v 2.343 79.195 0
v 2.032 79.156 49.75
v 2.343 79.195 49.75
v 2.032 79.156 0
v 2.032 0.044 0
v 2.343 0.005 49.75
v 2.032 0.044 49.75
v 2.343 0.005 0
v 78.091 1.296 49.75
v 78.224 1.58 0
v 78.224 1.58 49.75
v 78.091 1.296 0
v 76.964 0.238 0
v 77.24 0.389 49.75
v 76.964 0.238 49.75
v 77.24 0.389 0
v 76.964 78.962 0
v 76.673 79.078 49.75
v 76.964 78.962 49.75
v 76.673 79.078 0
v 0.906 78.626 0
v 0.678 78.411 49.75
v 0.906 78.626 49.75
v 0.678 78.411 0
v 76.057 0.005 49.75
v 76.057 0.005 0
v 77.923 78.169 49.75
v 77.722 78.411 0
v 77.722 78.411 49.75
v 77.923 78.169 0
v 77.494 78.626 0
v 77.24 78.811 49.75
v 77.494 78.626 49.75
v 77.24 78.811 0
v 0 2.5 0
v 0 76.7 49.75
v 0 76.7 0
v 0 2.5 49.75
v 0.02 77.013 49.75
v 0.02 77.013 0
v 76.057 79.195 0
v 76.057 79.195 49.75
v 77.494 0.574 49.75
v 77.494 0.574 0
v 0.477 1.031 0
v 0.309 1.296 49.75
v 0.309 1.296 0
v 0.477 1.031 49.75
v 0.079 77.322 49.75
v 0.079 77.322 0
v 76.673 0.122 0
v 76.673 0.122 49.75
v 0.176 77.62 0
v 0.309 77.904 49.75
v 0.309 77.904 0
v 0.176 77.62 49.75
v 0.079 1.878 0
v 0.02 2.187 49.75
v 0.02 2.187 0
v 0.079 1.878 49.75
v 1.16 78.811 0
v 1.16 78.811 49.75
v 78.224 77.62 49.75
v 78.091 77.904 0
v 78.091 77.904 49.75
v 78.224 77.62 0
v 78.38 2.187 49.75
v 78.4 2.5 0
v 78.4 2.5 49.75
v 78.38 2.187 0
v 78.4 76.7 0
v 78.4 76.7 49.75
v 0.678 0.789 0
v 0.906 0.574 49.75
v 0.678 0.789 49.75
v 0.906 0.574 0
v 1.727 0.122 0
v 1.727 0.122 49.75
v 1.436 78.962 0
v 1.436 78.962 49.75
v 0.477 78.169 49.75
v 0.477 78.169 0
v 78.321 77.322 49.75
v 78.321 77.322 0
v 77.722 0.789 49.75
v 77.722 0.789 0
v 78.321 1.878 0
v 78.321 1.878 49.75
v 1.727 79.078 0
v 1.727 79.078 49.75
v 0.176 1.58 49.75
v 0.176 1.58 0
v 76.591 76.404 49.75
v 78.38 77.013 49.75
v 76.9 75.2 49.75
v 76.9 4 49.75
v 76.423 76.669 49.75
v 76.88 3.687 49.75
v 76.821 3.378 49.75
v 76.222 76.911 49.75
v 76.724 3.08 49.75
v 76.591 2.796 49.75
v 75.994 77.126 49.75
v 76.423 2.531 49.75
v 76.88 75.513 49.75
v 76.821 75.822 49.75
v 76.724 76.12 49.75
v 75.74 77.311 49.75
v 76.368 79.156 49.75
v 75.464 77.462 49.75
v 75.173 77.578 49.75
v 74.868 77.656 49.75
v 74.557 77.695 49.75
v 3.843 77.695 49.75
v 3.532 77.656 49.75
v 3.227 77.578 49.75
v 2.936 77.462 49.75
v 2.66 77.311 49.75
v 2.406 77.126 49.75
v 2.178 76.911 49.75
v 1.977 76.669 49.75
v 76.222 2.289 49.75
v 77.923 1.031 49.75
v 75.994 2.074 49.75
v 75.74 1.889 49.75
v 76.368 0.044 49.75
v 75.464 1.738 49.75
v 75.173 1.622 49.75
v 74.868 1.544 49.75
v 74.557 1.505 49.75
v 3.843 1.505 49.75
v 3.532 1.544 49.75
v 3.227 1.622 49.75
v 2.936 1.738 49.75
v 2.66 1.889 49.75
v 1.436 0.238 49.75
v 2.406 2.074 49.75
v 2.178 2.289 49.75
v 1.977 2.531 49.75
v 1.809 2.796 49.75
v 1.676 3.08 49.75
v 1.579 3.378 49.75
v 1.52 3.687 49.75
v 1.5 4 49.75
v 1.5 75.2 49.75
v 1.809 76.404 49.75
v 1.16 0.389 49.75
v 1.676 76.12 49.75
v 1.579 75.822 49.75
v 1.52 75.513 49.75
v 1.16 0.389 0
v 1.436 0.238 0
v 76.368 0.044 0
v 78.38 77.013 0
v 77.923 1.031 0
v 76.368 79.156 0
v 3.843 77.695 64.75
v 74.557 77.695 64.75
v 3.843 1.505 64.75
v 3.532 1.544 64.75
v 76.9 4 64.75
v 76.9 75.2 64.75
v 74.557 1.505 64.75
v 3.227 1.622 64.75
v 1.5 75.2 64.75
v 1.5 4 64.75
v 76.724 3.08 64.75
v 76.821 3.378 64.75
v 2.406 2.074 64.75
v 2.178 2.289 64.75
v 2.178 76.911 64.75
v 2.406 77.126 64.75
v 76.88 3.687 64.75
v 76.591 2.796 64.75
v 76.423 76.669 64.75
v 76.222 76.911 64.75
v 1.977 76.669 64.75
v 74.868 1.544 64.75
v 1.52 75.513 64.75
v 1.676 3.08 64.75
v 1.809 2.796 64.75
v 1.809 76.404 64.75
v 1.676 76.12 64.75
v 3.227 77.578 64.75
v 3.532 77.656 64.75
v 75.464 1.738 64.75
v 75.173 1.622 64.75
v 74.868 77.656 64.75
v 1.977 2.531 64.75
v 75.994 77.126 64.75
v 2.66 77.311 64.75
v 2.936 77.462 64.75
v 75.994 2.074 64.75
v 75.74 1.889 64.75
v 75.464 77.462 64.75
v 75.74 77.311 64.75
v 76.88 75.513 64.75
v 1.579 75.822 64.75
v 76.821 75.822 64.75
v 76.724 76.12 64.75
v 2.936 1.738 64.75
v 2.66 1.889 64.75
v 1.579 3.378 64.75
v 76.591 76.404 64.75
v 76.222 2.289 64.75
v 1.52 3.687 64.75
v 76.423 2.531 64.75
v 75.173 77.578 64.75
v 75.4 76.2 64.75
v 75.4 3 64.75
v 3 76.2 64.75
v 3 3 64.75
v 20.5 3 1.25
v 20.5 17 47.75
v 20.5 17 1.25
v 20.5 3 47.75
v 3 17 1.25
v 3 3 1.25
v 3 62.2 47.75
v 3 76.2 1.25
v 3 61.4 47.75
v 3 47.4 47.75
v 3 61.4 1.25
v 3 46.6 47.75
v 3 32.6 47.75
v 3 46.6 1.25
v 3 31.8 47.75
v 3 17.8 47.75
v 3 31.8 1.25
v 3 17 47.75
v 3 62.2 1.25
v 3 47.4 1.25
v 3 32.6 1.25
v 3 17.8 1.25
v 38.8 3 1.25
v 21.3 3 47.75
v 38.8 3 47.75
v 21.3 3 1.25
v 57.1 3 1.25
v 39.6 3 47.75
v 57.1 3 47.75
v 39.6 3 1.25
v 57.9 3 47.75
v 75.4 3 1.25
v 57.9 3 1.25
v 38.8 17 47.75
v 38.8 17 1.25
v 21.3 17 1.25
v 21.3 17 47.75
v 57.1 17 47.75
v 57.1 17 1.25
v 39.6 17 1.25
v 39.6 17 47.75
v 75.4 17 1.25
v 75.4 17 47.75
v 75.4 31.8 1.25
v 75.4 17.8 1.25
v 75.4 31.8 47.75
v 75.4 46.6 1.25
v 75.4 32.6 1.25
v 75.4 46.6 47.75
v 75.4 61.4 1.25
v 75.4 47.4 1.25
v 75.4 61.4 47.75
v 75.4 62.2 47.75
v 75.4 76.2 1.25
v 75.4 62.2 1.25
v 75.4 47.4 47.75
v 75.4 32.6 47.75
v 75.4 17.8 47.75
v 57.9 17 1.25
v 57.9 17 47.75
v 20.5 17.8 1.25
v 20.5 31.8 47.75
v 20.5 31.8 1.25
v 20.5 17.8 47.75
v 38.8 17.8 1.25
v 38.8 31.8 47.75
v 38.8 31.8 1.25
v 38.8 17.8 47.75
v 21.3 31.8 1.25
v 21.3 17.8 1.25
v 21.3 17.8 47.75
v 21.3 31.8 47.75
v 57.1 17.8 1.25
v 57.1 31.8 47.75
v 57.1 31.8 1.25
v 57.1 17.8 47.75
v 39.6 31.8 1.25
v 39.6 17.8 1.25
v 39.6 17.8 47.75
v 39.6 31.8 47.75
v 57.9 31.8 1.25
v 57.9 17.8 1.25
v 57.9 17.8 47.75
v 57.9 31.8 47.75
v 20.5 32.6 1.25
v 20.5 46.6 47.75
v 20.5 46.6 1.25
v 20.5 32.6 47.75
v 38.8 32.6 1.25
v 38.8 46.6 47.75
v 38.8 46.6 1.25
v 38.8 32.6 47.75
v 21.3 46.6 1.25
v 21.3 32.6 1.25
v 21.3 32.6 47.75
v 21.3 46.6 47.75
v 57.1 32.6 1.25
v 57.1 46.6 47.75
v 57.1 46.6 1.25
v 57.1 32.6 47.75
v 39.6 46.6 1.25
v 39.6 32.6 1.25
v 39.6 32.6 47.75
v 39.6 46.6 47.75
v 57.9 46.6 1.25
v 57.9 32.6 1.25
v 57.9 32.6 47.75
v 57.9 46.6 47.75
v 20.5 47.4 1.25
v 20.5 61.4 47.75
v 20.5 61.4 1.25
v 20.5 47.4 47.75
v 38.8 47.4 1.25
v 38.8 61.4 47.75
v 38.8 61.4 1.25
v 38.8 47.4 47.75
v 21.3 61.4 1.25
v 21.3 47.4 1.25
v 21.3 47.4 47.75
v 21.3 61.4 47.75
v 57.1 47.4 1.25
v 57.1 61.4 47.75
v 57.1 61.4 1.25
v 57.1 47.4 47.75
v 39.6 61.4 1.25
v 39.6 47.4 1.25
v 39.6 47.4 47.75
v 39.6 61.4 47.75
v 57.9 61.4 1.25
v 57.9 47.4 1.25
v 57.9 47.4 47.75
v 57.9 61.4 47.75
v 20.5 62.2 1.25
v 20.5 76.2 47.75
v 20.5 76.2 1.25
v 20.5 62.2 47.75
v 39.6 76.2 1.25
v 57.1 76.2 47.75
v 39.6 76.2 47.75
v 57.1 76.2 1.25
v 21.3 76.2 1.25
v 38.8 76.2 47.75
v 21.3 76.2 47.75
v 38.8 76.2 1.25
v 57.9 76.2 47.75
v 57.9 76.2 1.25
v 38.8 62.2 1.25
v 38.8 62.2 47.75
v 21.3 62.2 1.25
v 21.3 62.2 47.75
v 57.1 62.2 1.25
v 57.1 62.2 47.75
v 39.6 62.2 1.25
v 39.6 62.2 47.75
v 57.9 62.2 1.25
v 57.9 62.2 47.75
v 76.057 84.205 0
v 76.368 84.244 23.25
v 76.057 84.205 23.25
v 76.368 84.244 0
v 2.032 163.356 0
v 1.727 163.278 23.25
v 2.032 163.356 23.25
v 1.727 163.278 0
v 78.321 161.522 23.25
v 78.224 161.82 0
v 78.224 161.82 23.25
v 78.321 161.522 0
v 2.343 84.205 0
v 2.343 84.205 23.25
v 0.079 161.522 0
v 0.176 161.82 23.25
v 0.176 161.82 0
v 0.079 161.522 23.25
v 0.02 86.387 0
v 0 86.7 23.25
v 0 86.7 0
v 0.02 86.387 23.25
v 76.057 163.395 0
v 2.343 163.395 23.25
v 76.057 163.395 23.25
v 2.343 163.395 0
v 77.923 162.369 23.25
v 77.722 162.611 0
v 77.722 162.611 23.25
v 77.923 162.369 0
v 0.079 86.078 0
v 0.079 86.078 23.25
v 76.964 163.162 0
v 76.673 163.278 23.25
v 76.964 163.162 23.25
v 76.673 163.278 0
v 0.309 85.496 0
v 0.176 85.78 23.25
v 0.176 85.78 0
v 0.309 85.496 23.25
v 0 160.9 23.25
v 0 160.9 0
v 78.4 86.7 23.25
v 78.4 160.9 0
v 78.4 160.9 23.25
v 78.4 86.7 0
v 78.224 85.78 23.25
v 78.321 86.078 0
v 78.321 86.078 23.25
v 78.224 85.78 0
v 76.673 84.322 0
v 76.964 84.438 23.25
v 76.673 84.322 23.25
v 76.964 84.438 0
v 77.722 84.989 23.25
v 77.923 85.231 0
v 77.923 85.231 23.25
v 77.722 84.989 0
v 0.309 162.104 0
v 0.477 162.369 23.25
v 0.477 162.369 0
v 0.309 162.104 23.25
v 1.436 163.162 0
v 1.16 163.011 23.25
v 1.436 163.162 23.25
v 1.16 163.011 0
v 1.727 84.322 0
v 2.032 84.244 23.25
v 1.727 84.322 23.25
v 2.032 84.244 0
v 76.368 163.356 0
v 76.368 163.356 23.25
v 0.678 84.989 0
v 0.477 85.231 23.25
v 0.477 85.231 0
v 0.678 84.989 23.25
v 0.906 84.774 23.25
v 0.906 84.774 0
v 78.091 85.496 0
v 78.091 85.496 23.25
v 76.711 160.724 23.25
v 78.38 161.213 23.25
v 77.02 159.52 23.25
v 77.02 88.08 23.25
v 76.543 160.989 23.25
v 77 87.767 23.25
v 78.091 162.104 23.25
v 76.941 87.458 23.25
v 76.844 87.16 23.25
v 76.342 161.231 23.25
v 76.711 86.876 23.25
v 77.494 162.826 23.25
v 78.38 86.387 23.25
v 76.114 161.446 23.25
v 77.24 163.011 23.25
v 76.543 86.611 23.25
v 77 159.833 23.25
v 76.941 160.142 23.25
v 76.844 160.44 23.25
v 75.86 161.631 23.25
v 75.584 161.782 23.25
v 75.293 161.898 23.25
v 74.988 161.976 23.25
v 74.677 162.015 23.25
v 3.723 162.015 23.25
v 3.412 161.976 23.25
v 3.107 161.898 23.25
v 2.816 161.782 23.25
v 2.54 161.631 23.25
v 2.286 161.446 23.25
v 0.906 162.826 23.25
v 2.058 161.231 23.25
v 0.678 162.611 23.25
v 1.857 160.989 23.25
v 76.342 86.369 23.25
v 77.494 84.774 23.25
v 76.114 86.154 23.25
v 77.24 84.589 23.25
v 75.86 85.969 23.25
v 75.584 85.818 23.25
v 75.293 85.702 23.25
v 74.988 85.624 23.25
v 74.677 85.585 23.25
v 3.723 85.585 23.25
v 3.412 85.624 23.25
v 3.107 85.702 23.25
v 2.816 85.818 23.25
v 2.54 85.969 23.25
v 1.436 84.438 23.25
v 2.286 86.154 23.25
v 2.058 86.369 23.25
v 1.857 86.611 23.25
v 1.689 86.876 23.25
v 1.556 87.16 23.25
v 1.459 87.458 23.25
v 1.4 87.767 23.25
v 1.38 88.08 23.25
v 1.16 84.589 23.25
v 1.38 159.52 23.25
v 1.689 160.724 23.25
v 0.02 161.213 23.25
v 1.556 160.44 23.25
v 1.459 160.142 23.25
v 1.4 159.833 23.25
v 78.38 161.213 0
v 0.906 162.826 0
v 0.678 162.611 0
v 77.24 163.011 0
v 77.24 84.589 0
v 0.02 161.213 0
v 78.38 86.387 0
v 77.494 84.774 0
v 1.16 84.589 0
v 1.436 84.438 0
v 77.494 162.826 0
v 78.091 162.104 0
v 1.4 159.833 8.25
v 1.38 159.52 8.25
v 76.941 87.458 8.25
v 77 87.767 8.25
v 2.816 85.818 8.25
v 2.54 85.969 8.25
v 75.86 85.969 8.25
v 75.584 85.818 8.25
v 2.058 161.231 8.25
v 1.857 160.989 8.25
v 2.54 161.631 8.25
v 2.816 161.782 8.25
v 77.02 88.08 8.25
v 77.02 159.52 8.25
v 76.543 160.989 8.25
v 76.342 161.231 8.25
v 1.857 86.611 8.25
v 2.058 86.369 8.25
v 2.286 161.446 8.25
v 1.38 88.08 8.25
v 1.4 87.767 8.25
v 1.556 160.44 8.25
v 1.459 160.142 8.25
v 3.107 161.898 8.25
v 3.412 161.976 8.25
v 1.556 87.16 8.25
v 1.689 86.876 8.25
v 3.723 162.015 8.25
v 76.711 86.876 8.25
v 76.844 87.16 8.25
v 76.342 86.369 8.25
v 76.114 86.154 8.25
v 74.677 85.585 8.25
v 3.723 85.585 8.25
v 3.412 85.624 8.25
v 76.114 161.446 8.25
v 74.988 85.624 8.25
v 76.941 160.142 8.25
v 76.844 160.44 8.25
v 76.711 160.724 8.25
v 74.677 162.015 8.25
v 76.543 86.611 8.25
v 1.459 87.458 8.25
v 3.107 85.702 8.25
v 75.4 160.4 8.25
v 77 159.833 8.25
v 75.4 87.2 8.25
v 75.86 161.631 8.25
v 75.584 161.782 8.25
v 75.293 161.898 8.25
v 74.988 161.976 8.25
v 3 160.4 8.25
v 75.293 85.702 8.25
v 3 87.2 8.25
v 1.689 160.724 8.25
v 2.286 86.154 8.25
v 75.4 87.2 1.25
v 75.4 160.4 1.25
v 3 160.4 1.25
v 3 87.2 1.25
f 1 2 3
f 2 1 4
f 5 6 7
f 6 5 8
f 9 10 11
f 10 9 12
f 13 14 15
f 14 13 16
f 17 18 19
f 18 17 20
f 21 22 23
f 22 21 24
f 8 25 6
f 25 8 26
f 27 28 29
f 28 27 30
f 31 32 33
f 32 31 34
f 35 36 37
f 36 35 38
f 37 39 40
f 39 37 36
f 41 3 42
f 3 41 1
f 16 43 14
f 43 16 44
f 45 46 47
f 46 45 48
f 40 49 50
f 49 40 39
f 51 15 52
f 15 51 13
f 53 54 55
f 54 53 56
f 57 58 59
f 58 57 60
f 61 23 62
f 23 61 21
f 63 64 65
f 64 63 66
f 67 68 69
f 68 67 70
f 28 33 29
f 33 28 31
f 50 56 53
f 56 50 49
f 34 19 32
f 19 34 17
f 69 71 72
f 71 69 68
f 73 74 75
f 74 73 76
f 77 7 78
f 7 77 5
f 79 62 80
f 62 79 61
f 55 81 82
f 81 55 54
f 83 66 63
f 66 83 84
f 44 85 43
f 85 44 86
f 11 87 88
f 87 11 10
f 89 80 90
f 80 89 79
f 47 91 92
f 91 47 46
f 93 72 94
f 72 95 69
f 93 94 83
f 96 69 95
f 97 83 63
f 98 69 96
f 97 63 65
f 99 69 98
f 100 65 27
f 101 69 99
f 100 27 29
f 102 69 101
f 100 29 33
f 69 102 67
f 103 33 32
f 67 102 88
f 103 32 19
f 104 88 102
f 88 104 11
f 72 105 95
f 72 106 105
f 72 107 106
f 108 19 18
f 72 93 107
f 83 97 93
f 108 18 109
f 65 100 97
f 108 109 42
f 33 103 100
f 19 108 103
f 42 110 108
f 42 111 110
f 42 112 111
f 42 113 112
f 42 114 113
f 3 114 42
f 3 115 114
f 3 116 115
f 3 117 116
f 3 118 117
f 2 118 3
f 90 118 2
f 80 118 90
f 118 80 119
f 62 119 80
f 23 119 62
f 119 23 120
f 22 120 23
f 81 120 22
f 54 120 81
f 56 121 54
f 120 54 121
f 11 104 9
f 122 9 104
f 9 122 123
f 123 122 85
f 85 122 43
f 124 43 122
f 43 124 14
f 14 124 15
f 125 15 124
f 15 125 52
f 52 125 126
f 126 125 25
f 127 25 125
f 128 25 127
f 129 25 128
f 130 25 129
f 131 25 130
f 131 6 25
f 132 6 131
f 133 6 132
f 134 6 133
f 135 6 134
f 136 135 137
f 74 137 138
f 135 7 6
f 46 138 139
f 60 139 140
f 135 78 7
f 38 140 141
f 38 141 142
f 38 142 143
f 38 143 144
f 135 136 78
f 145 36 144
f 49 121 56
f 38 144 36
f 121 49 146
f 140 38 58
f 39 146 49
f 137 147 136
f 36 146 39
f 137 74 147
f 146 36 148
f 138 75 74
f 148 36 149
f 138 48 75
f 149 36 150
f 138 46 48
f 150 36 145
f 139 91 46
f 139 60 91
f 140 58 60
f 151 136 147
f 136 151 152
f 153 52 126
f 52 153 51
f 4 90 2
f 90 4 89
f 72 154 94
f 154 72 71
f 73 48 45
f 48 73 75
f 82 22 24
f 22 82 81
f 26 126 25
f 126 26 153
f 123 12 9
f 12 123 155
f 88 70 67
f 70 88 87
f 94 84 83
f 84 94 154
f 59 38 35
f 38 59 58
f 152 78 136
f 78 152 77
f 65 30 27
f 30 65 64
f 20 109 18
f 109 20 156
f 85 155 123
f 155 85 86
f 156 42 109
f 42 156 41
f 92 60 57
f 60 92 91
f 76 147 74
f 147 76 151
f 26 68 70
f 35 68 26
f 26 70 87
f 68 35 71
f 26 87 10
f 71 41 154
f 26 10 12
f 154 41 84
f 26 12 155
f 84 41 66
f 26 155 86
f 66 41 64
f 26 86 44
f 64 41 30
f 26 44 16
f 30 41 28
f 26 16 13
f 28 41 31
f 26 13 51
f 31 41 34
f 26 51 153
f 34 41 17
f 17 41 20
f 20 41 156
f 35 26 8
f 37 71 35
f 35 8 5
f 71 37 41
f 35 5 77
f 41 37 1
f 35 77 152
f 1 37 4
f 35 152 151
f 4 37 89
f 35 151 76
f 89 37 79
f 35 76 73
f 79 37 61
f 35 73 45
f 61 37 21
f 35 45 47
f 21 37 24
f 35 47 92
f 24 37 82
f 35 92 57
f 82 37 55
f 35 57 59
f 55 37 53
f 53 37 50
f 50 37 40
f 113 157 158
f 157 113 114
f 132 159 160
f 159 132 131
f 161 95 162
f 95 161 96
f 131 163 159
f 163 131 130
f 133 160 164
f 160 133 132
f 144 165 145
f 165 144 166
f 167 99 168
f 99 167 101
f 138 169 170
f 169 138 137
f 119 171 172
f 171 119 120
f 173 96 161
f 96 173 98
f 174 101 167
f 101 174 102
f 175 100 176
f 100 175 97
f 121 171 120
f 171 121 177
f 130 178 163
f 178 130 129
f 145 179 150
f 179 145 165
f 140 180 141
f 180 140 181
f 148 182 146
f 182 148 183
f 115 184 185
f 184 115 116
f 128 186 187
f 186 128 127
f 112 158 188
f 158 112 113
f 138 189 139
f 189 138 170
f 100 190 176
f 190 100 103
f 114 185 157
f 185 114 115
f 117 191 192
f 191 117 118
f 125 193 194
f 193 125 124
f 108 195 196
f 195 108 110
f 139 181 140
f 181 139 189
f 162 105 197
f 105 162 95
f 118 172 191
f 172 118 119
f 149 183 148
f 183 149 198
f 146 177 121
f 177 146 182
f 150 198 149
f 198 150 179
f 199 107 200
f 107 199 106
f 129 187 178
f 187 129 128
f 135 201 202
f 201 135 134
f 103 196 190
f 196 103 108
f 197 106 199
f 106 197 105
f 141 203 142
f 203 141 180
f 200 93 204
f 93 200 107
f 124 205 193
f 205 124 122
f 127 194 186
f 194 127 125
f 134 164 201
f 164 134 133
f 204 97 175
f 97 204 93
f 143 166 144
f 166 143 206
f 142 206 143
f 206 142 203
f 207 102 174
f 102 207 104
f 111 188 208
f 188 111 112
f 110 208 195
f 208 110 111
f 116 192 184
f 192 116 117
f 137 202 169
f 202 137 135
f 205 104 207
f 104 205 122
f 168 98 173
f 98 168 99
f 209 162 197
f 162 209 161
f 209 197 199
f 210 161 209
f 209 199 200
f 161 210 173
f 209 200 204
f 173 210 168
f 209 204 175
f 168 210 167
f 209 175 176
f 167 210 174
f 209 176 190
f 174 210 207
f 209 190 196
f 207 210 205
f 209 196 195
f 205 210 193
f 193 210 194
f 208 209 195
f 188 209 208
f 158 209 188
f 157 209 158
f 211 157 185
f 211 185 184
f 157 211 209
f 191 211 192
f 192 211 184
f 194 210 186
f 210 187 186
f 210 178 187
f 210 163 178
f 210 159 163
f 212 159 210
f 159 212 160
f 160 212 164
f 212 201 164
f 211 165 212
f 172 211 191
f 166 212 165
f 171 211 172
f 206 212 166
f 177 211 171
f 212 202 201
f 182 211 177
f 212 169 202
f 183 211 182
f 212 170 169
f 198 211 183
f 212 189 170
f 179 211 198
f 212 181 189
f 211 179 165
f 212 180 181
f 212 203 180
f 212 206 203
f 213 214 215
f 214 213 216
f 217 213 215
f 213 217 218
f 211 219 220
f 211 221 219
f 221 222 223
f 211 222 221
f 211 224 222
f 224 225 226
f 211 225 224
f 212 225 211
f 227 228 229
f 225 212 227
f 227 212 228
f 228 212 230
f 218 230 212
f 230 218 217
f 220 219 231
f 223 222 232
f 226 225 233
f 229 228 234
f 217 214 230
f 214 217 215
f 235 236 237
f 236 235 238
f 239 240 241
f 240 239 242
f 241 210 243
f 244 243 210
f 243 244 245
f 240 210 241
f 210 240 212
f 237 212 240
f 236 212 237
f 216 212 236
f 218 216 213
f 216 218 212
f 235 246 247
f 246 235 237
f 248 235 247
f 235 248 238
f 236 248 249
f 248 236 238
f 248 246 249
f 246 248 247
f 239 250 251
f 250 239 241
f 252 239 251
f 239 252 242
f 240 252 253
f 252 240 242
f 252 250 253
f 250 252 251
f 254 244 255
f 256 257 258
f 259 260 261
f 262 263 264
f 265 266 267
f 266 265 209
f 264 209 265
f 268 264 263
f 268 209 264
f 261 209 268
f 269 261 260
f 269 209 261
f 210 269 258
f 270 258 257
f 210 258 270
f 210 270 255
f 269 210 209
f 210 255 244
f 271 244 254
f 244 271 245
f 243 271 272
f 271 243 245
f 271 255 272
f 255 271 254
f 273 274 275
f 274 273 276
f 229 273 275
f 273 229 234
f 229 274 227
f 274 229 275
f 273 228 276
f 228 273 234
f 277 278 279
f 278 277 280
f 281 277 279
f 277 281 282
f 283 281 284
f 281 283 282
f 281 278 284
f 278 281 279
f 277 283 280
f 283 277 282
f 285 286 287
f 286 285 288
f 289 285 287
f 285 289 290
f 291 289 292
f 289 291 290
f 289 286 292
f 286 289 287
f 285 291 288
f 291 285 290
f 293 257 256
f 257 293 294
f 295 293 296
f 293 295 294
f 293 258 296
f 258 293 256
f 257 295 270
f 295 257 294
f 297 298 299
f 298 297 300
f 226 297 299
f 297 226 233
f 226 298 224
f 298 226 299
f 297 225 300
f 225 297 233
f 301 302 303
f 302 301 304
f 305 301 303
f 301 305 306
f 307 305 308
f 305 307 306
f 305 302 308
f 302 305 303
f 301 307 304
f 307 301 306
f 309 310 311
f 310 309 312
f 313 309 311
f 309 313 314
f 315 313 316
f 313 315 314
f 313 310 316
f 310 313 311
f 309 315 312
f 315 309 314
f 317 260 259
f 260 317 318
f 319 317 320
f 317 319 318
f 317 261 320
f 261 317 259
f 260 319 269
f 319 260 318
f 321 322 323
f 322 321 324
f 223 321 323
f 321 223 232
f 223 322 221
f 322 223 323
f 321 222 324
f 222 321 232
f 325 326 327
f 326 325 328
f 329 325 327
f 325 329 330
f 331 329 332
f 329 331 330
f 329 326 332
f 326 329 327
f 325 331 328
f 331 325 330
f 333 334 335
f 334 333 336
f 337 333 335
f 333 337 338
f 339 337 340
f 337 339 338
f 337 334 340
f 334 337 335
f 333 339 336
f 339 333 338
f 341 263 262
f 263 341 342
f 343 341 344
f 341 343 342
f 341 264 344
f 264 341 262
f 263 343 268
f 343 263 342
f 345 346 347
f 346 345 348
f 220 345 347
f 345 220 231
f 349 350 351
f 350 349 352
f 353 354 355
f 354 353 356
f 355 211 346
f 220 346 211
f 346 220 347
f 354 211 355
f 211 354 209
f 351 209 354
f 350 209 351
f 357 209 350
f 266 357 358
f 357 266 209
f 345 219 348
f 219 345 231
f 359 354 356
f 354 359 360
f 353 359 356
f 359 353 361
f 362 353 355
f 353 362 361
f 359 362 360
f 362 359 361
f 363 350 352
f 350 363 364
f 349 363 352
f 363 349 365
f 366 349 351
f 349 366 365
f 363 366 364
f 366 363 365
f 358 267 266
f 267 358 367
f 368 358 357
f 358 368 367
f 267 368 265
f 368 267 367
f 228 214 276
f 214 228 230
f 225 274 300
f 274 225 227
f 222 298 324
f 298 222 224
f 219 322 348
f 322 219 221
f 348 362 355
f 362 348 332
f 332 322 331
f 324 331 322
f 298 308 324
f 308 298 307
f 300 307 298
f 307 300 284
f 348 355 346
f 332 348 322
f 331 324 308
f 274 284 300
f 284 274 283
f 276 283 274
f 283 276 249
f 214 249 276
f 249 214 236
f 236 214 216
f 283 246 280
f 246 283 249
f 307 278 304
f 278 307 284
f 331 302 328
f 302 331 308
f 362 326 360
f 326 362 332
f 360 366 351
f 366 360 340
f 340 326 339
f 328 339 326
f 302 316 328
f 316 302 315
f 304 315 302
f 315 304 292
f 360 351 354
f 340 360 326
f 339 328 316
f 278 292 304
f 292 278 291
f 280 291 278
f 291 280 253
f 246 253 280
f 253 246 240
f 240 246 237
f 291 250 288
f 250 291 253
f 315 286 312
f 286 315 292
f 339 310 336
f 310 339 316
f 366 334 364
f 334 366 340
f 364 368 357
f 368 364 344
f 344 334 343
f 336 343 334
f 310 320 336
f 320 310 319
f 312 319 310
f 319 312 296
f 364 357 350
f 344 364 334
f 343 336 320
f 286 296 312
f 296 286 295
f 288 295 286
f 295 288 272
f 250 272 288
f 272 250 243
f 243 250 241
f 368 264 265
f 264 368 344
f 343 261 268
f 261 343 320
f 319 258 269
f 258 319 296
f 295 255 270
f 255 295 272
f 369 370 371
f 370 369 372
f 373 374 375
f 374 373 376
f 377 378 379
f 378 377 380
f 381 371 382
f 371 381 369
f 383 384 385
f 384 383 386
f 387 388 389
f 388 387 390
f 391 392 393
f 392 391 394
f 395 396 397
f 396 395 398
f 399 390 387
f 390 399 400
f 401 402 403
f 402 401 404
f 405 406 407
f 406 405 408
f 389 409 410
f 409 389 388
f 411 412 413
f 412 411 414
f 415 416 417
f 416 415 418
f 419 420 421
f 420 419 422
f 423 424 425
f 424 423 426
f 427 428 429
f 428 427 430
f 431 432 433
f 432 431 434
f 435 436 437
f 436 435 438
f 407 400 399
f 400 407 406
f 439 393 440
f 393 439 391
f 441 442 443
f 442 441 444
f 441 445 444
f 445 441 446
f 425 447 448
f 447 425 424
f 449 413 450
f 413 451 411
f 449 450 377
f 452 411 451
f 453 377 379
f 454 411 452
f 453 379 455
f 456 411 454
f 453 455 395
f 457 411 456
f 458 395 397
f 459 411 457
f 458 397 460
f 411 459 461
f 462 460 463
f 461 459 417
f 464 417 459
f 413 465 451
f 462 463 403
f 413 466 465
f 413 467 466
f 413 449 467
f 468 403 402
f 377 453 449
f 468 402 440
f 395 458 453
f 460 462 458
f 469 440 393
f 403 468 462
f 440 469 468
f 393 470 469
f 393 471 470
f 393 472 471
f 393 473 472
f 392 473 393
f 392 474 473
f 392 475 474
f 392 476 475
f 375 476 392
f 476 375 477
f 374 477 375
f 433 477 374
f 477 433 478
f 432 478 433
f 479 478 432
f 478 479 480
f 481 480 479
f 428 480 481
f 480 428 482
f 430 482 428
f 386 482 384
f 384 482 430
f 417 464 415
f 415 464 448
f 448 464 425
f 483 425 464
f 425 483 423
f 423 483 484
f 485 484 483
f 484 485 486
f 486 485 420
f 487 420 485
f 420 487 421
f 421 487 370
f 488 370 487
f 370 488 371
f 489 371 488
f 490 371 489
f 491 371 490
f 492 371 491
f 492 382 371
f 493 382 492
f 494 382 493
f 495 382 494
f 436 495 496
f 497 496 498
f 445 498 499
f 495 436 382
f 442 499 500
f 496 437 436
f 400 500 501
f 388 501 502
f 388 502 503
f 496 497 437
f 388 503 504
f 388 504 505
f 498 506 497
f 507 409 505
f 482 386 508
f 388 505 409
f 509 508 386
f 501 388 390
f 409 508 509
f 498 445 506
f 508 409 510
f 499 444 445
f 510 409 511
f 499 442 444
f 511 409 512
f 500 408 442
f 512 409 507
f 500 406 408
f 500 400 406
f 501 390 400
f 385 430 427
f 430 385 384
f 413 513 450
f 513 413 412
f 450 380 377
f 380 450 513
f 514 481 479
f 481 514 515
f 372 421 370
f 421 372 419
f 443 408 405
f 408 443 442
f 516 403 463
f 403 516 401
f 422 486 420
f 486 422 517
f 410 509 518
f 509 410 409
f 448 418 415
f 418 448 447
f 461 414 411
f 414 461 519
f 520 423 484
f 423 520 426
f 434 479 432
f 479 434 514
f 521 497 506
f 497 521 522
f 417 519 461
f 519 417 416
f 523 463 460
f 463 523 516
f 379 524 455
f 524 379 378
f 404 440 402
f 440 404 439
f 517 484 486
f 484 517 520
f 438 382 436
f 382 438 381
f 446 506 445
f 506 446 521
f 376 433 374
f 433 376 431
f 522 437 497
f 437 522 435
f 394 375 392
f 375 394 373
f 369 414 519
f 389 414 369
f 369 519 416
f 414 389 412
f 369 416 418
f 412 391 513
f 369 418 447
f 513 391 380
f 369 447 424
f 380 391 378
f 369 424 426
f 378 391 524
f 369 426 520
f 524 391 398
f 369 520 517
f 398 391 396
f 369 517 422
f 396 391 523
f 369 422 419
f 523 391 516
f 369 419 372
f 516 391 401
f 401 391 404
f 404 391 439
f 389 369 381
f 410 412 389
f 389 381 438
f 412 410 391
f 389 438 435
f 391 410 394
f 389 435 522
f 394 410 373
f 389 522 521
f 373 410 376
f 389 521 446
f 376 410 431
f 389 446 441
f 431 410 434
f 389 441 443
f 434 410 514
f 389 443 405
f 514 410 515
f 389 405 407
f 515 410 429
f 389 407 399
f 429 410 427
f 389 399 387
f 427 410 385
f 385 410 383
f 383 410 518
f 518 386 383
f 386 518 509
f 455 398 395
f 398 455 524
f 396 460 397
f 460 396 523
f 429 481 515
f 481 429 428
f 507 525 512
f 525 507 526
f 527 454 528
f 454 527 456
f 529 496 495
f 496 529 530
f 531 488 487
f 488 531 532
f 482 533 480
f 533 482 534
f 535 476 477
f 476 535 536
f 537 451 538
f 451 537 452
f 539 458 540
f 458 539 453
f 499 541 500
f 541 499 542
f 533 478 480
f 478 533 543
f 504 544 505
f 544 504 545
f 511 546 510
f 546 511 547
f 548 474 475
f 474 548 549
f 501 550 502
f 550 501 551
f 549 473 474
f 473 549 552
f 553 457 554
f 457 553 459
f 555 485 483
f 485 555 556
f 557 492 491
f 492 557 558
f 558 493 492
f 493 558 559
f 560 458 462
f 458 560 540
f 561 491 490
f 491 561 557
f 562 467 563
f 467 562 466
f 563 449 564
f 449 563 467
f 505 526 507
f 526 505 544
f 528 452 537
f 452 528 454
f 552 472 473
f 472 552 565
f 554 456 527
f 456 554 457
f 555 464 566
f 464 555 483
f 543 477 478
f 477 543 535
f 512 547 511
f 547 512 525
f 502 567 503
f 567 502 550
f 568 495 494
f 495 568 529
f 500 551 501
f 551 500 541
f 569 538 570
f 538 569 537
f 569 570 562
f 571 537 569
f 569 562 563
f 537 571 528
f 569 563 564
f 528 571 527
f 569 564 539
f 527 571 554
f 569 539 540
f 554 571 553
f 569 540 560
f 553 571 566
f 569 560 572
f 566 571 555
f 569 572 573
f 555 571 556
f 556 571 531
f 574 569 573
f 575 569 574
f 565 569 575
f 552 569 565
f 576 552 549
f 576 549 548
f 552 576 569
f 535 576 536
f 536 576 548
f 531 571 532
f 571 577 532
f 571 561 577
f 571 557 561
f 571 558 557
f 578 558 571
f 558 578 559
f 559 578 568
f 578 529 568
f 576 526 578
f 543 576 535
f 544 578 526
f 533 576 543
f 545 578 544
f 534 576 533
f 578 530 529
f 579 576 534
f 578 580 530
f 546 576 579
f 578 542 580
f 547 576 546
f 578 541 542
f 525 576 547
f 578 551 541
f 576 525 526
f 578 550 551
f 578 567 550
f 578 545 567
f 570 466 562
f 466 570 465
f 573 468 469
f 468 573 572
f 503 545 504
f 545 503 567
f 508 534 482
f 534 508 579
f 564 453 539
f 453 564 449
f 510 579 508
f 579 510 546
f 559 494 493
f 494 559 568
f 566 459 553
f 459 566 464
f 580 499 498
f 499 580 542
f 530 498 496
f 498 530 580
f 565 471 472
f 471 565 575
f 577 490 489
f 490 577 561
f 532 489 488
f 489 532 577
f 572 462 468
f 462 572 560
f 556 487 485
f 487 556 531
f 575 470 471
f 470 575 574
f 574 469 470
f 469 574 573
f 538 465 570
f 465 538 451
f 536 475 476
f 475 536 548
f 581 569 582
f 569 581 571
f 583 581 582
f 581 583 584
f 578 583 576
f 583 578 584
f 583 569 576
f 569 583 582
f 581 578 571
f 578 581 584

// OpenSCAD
/* [General] */
// Which part to display
part = "both"; // [bottom, top, both]
// Amount of rows
rows = 5;
// Amount of columns
cols = 4;

// Length of the compartment
length = 17.5;
// Width of the compartment
width = 14;
// Height of the compartment
height = 46.5;

// Outer thickness
outerWall = 3;
// Top and bottom thickness
bottomHeight = 1.25;
// Wall thickness between compartments
innerWalls = 0.8;

// Roundness of the corners
roundness = 2.5;

/* [Top Cover] */
// Height of above the height of the compartment
paddingTop = 17;
// Height of the connecting wall
outerWallTopHeight = 15;
// Extra height of the top piece
extraHeightTop = 7;

// Thickness of the conecting wall on bottom piece
outerWallTop = 1.5;
// Tollerance on the top piece
tolerance = 0.12;

/* [Hidden] */
$fn = 50;
totalWidthOuter = outerWall * 2 + rows * width + (rows -1) * innerWalls;
totalWidth = rows * width + (rows -1) * innerWalls;
totalLengthOuter = outerWall * 2 + cols * length + (cols -1) * innerWalls;
totalLength = cols * length + (cols -1) * innerWalls;

bottomHeightTotal = bottomHeight + height + paddingTop;

if (part == "bottom") {
  bottom();
}
if (part == "top") {
  top();
}
if (part == "both") {
  both();
}

module both() {
  bottom();
  translate([0, totalWidthOuter + 5, 0])
    top();
}

module top() {
  difference() {
    group() {
      //cube([totalLengthOuter, totalWidthOuter, bottomHeight + outerWallTopHeight + extraHeightTop]);
      hull() {
        translate([roundness, roundness, 0])
          cylinder(r = roundness, h = bottomHeight + outerWallTopHeight + extraHeightTop);
        translate([totalLengthOuter - roundness, roundness, 0])
          cylinder(r = roundness, h = bottomHeight + outerWallTopHeight + extraHeightTop);
        translate([totalLengthOuter - roundness, totalWidthOuter - roundness, 0])
          cylinder(r = roundness, h = bottomHeight + outerWallTopHeight + extraHeightTop);
        translate([roundness, totalWidthOuter - roundness, 0])
          cylinder(r = roundness, h = bottomHeight + outerWallTopHeight + extraHeightTop);
      }
    }
    translate([outerWall - outerWallTop - tolerance, outerWall - outerWallTop - tolerance, bottomHeight + extraHeightTop]) {
      //cube([totalLength + (outerWallTop + tolerance) * 2, totalWidth + (outerWallTop + tolerance) * 2, outerWallTopHeight + 1]);
      
      hull() {
        translate([roundness, roundness, 0])
          cylinder(r = roundness, h = bottomHeight + outerWallTopHeight + extraHeightTop);
        translate([totalLength + (outerWallTop + tolerance) * 2 - roundness, roundness, 0])
          cylinder(r = roundness, h = bottomHeight + outerWallTopHeight + extraHeightTop);
        translate([totalLength + (outerWallTop + tolerance) * 2 - roundness, totalWidth + (outerWallTop + tolerance) * 2 - roundness, 0])
          cylinder(r = roundness, h = bottomHeight + outerWallTopHeight + extraHeightTop);
        translate([roundness, totalWidth + (outerWallTop + tolerance) * 2 - roundness, 0])
          cylinder(r = roundness, h = bottomHeight + outerWallTopHeight + extraHeightTop);
      }
    }

    translate([outerWall, outerWall, bottomHeight]) {
      cube([totalLength, totalWidth, bottomHeightTotal]);
      /*
      hull() {
        translate([roundness, roundness, 0])
          cylinder(r = roundness, h = bottomHeight + outerWallTopHeight + extraHeightTop);
        translate([totalLength - roundness, roundness, 0])
          cylinder(r = roundness, h = bottomHeight + outerWallTopHeight + extraHeightTop);
        translate([totalLength - roundness, totalWidth - roundness, 0])
          cylinder(r = roundness, h = bottomHeight + outerWallTopHeight + extraHeightTop);
        translate([roundness, totalWidth - roundness, 0])
          cylinder(r = roundness, h = bottomHeight + outerWallTopHeight + extraHeightTop);
      }
      */
    }
  }
}

module bottom() {
  difference() {
    group() {
      //cube([totalLengthOuter, totalWidthOuter, bottomHeightTotal - outerWallTopHeight]);
      hull() {
        translate([roundness, roundness, 0])
          cylinder(r = roundness, h = bottomHeightTotal - outerWallTopHeight);
        translate([totalLengthOuter - roundness, roundness, 0])
          cylinder(r = roundness, h = bottomHeightTotal - outerWallTopHeight);
        translate([totalLengthOuter - roundness, totalWidthOuter - roundness, 0])
          cylinder(r = roundness, h = bottomHeightTotal - outerWallTopHeight);
        translate([roundness, totalWidthOuter - roundness, 0])
          cylinder(r = roundness, h = bottomHeightTotal - outerWallTopHeight);
      }
      translate([outerWall-outerWallTop, outerWall-outerWallTop, 0]) {
        //cube([totalLengthOuter - (outerWall-outerWallTop) * 2, totalWidthOuter - (outerWall-outerWallTop) * 2, bottomHeightTotal]);
        hull() {
          translate([roundness, roundness, 0])
            cylinder(r = roundness, h = bottomHeightTotal);
          translate([totalLength + outerWallTop * 2 - roundness, roundness, 0])
            cylinder(r = roundness, h = bottomHeightTotal);
          translate([totalLength + outerWallTop* 2 - roundness, totalWidth + outerWallTop * 2 - roundness, 0])
            cylinder(r = roundness, h = bottomHeightTotal);
          translate([roundness, totalWidth + outerWallTop * 2 - roundness, 0])
            cylinder(r = roundness, h = bottomHeightTotal);
        }
      }
    }

    translate([outerWall, outerWall, bottomHeight + height])
      cube([totalLength, totalWidth, bottomHeightTotal]);
    
    translate([outerWall, outerWall, bottomHeight]) {
      for(row=[0:1:(rows - 1)]) {
        for(col=[0:1:(cols - 1)]) {
          translate([(length+innerWalls) * col, (width + innerWalls) * row, 0])
            cube([length, width, bottomHeightTotal]);
        }
      }
    }
  }
}
